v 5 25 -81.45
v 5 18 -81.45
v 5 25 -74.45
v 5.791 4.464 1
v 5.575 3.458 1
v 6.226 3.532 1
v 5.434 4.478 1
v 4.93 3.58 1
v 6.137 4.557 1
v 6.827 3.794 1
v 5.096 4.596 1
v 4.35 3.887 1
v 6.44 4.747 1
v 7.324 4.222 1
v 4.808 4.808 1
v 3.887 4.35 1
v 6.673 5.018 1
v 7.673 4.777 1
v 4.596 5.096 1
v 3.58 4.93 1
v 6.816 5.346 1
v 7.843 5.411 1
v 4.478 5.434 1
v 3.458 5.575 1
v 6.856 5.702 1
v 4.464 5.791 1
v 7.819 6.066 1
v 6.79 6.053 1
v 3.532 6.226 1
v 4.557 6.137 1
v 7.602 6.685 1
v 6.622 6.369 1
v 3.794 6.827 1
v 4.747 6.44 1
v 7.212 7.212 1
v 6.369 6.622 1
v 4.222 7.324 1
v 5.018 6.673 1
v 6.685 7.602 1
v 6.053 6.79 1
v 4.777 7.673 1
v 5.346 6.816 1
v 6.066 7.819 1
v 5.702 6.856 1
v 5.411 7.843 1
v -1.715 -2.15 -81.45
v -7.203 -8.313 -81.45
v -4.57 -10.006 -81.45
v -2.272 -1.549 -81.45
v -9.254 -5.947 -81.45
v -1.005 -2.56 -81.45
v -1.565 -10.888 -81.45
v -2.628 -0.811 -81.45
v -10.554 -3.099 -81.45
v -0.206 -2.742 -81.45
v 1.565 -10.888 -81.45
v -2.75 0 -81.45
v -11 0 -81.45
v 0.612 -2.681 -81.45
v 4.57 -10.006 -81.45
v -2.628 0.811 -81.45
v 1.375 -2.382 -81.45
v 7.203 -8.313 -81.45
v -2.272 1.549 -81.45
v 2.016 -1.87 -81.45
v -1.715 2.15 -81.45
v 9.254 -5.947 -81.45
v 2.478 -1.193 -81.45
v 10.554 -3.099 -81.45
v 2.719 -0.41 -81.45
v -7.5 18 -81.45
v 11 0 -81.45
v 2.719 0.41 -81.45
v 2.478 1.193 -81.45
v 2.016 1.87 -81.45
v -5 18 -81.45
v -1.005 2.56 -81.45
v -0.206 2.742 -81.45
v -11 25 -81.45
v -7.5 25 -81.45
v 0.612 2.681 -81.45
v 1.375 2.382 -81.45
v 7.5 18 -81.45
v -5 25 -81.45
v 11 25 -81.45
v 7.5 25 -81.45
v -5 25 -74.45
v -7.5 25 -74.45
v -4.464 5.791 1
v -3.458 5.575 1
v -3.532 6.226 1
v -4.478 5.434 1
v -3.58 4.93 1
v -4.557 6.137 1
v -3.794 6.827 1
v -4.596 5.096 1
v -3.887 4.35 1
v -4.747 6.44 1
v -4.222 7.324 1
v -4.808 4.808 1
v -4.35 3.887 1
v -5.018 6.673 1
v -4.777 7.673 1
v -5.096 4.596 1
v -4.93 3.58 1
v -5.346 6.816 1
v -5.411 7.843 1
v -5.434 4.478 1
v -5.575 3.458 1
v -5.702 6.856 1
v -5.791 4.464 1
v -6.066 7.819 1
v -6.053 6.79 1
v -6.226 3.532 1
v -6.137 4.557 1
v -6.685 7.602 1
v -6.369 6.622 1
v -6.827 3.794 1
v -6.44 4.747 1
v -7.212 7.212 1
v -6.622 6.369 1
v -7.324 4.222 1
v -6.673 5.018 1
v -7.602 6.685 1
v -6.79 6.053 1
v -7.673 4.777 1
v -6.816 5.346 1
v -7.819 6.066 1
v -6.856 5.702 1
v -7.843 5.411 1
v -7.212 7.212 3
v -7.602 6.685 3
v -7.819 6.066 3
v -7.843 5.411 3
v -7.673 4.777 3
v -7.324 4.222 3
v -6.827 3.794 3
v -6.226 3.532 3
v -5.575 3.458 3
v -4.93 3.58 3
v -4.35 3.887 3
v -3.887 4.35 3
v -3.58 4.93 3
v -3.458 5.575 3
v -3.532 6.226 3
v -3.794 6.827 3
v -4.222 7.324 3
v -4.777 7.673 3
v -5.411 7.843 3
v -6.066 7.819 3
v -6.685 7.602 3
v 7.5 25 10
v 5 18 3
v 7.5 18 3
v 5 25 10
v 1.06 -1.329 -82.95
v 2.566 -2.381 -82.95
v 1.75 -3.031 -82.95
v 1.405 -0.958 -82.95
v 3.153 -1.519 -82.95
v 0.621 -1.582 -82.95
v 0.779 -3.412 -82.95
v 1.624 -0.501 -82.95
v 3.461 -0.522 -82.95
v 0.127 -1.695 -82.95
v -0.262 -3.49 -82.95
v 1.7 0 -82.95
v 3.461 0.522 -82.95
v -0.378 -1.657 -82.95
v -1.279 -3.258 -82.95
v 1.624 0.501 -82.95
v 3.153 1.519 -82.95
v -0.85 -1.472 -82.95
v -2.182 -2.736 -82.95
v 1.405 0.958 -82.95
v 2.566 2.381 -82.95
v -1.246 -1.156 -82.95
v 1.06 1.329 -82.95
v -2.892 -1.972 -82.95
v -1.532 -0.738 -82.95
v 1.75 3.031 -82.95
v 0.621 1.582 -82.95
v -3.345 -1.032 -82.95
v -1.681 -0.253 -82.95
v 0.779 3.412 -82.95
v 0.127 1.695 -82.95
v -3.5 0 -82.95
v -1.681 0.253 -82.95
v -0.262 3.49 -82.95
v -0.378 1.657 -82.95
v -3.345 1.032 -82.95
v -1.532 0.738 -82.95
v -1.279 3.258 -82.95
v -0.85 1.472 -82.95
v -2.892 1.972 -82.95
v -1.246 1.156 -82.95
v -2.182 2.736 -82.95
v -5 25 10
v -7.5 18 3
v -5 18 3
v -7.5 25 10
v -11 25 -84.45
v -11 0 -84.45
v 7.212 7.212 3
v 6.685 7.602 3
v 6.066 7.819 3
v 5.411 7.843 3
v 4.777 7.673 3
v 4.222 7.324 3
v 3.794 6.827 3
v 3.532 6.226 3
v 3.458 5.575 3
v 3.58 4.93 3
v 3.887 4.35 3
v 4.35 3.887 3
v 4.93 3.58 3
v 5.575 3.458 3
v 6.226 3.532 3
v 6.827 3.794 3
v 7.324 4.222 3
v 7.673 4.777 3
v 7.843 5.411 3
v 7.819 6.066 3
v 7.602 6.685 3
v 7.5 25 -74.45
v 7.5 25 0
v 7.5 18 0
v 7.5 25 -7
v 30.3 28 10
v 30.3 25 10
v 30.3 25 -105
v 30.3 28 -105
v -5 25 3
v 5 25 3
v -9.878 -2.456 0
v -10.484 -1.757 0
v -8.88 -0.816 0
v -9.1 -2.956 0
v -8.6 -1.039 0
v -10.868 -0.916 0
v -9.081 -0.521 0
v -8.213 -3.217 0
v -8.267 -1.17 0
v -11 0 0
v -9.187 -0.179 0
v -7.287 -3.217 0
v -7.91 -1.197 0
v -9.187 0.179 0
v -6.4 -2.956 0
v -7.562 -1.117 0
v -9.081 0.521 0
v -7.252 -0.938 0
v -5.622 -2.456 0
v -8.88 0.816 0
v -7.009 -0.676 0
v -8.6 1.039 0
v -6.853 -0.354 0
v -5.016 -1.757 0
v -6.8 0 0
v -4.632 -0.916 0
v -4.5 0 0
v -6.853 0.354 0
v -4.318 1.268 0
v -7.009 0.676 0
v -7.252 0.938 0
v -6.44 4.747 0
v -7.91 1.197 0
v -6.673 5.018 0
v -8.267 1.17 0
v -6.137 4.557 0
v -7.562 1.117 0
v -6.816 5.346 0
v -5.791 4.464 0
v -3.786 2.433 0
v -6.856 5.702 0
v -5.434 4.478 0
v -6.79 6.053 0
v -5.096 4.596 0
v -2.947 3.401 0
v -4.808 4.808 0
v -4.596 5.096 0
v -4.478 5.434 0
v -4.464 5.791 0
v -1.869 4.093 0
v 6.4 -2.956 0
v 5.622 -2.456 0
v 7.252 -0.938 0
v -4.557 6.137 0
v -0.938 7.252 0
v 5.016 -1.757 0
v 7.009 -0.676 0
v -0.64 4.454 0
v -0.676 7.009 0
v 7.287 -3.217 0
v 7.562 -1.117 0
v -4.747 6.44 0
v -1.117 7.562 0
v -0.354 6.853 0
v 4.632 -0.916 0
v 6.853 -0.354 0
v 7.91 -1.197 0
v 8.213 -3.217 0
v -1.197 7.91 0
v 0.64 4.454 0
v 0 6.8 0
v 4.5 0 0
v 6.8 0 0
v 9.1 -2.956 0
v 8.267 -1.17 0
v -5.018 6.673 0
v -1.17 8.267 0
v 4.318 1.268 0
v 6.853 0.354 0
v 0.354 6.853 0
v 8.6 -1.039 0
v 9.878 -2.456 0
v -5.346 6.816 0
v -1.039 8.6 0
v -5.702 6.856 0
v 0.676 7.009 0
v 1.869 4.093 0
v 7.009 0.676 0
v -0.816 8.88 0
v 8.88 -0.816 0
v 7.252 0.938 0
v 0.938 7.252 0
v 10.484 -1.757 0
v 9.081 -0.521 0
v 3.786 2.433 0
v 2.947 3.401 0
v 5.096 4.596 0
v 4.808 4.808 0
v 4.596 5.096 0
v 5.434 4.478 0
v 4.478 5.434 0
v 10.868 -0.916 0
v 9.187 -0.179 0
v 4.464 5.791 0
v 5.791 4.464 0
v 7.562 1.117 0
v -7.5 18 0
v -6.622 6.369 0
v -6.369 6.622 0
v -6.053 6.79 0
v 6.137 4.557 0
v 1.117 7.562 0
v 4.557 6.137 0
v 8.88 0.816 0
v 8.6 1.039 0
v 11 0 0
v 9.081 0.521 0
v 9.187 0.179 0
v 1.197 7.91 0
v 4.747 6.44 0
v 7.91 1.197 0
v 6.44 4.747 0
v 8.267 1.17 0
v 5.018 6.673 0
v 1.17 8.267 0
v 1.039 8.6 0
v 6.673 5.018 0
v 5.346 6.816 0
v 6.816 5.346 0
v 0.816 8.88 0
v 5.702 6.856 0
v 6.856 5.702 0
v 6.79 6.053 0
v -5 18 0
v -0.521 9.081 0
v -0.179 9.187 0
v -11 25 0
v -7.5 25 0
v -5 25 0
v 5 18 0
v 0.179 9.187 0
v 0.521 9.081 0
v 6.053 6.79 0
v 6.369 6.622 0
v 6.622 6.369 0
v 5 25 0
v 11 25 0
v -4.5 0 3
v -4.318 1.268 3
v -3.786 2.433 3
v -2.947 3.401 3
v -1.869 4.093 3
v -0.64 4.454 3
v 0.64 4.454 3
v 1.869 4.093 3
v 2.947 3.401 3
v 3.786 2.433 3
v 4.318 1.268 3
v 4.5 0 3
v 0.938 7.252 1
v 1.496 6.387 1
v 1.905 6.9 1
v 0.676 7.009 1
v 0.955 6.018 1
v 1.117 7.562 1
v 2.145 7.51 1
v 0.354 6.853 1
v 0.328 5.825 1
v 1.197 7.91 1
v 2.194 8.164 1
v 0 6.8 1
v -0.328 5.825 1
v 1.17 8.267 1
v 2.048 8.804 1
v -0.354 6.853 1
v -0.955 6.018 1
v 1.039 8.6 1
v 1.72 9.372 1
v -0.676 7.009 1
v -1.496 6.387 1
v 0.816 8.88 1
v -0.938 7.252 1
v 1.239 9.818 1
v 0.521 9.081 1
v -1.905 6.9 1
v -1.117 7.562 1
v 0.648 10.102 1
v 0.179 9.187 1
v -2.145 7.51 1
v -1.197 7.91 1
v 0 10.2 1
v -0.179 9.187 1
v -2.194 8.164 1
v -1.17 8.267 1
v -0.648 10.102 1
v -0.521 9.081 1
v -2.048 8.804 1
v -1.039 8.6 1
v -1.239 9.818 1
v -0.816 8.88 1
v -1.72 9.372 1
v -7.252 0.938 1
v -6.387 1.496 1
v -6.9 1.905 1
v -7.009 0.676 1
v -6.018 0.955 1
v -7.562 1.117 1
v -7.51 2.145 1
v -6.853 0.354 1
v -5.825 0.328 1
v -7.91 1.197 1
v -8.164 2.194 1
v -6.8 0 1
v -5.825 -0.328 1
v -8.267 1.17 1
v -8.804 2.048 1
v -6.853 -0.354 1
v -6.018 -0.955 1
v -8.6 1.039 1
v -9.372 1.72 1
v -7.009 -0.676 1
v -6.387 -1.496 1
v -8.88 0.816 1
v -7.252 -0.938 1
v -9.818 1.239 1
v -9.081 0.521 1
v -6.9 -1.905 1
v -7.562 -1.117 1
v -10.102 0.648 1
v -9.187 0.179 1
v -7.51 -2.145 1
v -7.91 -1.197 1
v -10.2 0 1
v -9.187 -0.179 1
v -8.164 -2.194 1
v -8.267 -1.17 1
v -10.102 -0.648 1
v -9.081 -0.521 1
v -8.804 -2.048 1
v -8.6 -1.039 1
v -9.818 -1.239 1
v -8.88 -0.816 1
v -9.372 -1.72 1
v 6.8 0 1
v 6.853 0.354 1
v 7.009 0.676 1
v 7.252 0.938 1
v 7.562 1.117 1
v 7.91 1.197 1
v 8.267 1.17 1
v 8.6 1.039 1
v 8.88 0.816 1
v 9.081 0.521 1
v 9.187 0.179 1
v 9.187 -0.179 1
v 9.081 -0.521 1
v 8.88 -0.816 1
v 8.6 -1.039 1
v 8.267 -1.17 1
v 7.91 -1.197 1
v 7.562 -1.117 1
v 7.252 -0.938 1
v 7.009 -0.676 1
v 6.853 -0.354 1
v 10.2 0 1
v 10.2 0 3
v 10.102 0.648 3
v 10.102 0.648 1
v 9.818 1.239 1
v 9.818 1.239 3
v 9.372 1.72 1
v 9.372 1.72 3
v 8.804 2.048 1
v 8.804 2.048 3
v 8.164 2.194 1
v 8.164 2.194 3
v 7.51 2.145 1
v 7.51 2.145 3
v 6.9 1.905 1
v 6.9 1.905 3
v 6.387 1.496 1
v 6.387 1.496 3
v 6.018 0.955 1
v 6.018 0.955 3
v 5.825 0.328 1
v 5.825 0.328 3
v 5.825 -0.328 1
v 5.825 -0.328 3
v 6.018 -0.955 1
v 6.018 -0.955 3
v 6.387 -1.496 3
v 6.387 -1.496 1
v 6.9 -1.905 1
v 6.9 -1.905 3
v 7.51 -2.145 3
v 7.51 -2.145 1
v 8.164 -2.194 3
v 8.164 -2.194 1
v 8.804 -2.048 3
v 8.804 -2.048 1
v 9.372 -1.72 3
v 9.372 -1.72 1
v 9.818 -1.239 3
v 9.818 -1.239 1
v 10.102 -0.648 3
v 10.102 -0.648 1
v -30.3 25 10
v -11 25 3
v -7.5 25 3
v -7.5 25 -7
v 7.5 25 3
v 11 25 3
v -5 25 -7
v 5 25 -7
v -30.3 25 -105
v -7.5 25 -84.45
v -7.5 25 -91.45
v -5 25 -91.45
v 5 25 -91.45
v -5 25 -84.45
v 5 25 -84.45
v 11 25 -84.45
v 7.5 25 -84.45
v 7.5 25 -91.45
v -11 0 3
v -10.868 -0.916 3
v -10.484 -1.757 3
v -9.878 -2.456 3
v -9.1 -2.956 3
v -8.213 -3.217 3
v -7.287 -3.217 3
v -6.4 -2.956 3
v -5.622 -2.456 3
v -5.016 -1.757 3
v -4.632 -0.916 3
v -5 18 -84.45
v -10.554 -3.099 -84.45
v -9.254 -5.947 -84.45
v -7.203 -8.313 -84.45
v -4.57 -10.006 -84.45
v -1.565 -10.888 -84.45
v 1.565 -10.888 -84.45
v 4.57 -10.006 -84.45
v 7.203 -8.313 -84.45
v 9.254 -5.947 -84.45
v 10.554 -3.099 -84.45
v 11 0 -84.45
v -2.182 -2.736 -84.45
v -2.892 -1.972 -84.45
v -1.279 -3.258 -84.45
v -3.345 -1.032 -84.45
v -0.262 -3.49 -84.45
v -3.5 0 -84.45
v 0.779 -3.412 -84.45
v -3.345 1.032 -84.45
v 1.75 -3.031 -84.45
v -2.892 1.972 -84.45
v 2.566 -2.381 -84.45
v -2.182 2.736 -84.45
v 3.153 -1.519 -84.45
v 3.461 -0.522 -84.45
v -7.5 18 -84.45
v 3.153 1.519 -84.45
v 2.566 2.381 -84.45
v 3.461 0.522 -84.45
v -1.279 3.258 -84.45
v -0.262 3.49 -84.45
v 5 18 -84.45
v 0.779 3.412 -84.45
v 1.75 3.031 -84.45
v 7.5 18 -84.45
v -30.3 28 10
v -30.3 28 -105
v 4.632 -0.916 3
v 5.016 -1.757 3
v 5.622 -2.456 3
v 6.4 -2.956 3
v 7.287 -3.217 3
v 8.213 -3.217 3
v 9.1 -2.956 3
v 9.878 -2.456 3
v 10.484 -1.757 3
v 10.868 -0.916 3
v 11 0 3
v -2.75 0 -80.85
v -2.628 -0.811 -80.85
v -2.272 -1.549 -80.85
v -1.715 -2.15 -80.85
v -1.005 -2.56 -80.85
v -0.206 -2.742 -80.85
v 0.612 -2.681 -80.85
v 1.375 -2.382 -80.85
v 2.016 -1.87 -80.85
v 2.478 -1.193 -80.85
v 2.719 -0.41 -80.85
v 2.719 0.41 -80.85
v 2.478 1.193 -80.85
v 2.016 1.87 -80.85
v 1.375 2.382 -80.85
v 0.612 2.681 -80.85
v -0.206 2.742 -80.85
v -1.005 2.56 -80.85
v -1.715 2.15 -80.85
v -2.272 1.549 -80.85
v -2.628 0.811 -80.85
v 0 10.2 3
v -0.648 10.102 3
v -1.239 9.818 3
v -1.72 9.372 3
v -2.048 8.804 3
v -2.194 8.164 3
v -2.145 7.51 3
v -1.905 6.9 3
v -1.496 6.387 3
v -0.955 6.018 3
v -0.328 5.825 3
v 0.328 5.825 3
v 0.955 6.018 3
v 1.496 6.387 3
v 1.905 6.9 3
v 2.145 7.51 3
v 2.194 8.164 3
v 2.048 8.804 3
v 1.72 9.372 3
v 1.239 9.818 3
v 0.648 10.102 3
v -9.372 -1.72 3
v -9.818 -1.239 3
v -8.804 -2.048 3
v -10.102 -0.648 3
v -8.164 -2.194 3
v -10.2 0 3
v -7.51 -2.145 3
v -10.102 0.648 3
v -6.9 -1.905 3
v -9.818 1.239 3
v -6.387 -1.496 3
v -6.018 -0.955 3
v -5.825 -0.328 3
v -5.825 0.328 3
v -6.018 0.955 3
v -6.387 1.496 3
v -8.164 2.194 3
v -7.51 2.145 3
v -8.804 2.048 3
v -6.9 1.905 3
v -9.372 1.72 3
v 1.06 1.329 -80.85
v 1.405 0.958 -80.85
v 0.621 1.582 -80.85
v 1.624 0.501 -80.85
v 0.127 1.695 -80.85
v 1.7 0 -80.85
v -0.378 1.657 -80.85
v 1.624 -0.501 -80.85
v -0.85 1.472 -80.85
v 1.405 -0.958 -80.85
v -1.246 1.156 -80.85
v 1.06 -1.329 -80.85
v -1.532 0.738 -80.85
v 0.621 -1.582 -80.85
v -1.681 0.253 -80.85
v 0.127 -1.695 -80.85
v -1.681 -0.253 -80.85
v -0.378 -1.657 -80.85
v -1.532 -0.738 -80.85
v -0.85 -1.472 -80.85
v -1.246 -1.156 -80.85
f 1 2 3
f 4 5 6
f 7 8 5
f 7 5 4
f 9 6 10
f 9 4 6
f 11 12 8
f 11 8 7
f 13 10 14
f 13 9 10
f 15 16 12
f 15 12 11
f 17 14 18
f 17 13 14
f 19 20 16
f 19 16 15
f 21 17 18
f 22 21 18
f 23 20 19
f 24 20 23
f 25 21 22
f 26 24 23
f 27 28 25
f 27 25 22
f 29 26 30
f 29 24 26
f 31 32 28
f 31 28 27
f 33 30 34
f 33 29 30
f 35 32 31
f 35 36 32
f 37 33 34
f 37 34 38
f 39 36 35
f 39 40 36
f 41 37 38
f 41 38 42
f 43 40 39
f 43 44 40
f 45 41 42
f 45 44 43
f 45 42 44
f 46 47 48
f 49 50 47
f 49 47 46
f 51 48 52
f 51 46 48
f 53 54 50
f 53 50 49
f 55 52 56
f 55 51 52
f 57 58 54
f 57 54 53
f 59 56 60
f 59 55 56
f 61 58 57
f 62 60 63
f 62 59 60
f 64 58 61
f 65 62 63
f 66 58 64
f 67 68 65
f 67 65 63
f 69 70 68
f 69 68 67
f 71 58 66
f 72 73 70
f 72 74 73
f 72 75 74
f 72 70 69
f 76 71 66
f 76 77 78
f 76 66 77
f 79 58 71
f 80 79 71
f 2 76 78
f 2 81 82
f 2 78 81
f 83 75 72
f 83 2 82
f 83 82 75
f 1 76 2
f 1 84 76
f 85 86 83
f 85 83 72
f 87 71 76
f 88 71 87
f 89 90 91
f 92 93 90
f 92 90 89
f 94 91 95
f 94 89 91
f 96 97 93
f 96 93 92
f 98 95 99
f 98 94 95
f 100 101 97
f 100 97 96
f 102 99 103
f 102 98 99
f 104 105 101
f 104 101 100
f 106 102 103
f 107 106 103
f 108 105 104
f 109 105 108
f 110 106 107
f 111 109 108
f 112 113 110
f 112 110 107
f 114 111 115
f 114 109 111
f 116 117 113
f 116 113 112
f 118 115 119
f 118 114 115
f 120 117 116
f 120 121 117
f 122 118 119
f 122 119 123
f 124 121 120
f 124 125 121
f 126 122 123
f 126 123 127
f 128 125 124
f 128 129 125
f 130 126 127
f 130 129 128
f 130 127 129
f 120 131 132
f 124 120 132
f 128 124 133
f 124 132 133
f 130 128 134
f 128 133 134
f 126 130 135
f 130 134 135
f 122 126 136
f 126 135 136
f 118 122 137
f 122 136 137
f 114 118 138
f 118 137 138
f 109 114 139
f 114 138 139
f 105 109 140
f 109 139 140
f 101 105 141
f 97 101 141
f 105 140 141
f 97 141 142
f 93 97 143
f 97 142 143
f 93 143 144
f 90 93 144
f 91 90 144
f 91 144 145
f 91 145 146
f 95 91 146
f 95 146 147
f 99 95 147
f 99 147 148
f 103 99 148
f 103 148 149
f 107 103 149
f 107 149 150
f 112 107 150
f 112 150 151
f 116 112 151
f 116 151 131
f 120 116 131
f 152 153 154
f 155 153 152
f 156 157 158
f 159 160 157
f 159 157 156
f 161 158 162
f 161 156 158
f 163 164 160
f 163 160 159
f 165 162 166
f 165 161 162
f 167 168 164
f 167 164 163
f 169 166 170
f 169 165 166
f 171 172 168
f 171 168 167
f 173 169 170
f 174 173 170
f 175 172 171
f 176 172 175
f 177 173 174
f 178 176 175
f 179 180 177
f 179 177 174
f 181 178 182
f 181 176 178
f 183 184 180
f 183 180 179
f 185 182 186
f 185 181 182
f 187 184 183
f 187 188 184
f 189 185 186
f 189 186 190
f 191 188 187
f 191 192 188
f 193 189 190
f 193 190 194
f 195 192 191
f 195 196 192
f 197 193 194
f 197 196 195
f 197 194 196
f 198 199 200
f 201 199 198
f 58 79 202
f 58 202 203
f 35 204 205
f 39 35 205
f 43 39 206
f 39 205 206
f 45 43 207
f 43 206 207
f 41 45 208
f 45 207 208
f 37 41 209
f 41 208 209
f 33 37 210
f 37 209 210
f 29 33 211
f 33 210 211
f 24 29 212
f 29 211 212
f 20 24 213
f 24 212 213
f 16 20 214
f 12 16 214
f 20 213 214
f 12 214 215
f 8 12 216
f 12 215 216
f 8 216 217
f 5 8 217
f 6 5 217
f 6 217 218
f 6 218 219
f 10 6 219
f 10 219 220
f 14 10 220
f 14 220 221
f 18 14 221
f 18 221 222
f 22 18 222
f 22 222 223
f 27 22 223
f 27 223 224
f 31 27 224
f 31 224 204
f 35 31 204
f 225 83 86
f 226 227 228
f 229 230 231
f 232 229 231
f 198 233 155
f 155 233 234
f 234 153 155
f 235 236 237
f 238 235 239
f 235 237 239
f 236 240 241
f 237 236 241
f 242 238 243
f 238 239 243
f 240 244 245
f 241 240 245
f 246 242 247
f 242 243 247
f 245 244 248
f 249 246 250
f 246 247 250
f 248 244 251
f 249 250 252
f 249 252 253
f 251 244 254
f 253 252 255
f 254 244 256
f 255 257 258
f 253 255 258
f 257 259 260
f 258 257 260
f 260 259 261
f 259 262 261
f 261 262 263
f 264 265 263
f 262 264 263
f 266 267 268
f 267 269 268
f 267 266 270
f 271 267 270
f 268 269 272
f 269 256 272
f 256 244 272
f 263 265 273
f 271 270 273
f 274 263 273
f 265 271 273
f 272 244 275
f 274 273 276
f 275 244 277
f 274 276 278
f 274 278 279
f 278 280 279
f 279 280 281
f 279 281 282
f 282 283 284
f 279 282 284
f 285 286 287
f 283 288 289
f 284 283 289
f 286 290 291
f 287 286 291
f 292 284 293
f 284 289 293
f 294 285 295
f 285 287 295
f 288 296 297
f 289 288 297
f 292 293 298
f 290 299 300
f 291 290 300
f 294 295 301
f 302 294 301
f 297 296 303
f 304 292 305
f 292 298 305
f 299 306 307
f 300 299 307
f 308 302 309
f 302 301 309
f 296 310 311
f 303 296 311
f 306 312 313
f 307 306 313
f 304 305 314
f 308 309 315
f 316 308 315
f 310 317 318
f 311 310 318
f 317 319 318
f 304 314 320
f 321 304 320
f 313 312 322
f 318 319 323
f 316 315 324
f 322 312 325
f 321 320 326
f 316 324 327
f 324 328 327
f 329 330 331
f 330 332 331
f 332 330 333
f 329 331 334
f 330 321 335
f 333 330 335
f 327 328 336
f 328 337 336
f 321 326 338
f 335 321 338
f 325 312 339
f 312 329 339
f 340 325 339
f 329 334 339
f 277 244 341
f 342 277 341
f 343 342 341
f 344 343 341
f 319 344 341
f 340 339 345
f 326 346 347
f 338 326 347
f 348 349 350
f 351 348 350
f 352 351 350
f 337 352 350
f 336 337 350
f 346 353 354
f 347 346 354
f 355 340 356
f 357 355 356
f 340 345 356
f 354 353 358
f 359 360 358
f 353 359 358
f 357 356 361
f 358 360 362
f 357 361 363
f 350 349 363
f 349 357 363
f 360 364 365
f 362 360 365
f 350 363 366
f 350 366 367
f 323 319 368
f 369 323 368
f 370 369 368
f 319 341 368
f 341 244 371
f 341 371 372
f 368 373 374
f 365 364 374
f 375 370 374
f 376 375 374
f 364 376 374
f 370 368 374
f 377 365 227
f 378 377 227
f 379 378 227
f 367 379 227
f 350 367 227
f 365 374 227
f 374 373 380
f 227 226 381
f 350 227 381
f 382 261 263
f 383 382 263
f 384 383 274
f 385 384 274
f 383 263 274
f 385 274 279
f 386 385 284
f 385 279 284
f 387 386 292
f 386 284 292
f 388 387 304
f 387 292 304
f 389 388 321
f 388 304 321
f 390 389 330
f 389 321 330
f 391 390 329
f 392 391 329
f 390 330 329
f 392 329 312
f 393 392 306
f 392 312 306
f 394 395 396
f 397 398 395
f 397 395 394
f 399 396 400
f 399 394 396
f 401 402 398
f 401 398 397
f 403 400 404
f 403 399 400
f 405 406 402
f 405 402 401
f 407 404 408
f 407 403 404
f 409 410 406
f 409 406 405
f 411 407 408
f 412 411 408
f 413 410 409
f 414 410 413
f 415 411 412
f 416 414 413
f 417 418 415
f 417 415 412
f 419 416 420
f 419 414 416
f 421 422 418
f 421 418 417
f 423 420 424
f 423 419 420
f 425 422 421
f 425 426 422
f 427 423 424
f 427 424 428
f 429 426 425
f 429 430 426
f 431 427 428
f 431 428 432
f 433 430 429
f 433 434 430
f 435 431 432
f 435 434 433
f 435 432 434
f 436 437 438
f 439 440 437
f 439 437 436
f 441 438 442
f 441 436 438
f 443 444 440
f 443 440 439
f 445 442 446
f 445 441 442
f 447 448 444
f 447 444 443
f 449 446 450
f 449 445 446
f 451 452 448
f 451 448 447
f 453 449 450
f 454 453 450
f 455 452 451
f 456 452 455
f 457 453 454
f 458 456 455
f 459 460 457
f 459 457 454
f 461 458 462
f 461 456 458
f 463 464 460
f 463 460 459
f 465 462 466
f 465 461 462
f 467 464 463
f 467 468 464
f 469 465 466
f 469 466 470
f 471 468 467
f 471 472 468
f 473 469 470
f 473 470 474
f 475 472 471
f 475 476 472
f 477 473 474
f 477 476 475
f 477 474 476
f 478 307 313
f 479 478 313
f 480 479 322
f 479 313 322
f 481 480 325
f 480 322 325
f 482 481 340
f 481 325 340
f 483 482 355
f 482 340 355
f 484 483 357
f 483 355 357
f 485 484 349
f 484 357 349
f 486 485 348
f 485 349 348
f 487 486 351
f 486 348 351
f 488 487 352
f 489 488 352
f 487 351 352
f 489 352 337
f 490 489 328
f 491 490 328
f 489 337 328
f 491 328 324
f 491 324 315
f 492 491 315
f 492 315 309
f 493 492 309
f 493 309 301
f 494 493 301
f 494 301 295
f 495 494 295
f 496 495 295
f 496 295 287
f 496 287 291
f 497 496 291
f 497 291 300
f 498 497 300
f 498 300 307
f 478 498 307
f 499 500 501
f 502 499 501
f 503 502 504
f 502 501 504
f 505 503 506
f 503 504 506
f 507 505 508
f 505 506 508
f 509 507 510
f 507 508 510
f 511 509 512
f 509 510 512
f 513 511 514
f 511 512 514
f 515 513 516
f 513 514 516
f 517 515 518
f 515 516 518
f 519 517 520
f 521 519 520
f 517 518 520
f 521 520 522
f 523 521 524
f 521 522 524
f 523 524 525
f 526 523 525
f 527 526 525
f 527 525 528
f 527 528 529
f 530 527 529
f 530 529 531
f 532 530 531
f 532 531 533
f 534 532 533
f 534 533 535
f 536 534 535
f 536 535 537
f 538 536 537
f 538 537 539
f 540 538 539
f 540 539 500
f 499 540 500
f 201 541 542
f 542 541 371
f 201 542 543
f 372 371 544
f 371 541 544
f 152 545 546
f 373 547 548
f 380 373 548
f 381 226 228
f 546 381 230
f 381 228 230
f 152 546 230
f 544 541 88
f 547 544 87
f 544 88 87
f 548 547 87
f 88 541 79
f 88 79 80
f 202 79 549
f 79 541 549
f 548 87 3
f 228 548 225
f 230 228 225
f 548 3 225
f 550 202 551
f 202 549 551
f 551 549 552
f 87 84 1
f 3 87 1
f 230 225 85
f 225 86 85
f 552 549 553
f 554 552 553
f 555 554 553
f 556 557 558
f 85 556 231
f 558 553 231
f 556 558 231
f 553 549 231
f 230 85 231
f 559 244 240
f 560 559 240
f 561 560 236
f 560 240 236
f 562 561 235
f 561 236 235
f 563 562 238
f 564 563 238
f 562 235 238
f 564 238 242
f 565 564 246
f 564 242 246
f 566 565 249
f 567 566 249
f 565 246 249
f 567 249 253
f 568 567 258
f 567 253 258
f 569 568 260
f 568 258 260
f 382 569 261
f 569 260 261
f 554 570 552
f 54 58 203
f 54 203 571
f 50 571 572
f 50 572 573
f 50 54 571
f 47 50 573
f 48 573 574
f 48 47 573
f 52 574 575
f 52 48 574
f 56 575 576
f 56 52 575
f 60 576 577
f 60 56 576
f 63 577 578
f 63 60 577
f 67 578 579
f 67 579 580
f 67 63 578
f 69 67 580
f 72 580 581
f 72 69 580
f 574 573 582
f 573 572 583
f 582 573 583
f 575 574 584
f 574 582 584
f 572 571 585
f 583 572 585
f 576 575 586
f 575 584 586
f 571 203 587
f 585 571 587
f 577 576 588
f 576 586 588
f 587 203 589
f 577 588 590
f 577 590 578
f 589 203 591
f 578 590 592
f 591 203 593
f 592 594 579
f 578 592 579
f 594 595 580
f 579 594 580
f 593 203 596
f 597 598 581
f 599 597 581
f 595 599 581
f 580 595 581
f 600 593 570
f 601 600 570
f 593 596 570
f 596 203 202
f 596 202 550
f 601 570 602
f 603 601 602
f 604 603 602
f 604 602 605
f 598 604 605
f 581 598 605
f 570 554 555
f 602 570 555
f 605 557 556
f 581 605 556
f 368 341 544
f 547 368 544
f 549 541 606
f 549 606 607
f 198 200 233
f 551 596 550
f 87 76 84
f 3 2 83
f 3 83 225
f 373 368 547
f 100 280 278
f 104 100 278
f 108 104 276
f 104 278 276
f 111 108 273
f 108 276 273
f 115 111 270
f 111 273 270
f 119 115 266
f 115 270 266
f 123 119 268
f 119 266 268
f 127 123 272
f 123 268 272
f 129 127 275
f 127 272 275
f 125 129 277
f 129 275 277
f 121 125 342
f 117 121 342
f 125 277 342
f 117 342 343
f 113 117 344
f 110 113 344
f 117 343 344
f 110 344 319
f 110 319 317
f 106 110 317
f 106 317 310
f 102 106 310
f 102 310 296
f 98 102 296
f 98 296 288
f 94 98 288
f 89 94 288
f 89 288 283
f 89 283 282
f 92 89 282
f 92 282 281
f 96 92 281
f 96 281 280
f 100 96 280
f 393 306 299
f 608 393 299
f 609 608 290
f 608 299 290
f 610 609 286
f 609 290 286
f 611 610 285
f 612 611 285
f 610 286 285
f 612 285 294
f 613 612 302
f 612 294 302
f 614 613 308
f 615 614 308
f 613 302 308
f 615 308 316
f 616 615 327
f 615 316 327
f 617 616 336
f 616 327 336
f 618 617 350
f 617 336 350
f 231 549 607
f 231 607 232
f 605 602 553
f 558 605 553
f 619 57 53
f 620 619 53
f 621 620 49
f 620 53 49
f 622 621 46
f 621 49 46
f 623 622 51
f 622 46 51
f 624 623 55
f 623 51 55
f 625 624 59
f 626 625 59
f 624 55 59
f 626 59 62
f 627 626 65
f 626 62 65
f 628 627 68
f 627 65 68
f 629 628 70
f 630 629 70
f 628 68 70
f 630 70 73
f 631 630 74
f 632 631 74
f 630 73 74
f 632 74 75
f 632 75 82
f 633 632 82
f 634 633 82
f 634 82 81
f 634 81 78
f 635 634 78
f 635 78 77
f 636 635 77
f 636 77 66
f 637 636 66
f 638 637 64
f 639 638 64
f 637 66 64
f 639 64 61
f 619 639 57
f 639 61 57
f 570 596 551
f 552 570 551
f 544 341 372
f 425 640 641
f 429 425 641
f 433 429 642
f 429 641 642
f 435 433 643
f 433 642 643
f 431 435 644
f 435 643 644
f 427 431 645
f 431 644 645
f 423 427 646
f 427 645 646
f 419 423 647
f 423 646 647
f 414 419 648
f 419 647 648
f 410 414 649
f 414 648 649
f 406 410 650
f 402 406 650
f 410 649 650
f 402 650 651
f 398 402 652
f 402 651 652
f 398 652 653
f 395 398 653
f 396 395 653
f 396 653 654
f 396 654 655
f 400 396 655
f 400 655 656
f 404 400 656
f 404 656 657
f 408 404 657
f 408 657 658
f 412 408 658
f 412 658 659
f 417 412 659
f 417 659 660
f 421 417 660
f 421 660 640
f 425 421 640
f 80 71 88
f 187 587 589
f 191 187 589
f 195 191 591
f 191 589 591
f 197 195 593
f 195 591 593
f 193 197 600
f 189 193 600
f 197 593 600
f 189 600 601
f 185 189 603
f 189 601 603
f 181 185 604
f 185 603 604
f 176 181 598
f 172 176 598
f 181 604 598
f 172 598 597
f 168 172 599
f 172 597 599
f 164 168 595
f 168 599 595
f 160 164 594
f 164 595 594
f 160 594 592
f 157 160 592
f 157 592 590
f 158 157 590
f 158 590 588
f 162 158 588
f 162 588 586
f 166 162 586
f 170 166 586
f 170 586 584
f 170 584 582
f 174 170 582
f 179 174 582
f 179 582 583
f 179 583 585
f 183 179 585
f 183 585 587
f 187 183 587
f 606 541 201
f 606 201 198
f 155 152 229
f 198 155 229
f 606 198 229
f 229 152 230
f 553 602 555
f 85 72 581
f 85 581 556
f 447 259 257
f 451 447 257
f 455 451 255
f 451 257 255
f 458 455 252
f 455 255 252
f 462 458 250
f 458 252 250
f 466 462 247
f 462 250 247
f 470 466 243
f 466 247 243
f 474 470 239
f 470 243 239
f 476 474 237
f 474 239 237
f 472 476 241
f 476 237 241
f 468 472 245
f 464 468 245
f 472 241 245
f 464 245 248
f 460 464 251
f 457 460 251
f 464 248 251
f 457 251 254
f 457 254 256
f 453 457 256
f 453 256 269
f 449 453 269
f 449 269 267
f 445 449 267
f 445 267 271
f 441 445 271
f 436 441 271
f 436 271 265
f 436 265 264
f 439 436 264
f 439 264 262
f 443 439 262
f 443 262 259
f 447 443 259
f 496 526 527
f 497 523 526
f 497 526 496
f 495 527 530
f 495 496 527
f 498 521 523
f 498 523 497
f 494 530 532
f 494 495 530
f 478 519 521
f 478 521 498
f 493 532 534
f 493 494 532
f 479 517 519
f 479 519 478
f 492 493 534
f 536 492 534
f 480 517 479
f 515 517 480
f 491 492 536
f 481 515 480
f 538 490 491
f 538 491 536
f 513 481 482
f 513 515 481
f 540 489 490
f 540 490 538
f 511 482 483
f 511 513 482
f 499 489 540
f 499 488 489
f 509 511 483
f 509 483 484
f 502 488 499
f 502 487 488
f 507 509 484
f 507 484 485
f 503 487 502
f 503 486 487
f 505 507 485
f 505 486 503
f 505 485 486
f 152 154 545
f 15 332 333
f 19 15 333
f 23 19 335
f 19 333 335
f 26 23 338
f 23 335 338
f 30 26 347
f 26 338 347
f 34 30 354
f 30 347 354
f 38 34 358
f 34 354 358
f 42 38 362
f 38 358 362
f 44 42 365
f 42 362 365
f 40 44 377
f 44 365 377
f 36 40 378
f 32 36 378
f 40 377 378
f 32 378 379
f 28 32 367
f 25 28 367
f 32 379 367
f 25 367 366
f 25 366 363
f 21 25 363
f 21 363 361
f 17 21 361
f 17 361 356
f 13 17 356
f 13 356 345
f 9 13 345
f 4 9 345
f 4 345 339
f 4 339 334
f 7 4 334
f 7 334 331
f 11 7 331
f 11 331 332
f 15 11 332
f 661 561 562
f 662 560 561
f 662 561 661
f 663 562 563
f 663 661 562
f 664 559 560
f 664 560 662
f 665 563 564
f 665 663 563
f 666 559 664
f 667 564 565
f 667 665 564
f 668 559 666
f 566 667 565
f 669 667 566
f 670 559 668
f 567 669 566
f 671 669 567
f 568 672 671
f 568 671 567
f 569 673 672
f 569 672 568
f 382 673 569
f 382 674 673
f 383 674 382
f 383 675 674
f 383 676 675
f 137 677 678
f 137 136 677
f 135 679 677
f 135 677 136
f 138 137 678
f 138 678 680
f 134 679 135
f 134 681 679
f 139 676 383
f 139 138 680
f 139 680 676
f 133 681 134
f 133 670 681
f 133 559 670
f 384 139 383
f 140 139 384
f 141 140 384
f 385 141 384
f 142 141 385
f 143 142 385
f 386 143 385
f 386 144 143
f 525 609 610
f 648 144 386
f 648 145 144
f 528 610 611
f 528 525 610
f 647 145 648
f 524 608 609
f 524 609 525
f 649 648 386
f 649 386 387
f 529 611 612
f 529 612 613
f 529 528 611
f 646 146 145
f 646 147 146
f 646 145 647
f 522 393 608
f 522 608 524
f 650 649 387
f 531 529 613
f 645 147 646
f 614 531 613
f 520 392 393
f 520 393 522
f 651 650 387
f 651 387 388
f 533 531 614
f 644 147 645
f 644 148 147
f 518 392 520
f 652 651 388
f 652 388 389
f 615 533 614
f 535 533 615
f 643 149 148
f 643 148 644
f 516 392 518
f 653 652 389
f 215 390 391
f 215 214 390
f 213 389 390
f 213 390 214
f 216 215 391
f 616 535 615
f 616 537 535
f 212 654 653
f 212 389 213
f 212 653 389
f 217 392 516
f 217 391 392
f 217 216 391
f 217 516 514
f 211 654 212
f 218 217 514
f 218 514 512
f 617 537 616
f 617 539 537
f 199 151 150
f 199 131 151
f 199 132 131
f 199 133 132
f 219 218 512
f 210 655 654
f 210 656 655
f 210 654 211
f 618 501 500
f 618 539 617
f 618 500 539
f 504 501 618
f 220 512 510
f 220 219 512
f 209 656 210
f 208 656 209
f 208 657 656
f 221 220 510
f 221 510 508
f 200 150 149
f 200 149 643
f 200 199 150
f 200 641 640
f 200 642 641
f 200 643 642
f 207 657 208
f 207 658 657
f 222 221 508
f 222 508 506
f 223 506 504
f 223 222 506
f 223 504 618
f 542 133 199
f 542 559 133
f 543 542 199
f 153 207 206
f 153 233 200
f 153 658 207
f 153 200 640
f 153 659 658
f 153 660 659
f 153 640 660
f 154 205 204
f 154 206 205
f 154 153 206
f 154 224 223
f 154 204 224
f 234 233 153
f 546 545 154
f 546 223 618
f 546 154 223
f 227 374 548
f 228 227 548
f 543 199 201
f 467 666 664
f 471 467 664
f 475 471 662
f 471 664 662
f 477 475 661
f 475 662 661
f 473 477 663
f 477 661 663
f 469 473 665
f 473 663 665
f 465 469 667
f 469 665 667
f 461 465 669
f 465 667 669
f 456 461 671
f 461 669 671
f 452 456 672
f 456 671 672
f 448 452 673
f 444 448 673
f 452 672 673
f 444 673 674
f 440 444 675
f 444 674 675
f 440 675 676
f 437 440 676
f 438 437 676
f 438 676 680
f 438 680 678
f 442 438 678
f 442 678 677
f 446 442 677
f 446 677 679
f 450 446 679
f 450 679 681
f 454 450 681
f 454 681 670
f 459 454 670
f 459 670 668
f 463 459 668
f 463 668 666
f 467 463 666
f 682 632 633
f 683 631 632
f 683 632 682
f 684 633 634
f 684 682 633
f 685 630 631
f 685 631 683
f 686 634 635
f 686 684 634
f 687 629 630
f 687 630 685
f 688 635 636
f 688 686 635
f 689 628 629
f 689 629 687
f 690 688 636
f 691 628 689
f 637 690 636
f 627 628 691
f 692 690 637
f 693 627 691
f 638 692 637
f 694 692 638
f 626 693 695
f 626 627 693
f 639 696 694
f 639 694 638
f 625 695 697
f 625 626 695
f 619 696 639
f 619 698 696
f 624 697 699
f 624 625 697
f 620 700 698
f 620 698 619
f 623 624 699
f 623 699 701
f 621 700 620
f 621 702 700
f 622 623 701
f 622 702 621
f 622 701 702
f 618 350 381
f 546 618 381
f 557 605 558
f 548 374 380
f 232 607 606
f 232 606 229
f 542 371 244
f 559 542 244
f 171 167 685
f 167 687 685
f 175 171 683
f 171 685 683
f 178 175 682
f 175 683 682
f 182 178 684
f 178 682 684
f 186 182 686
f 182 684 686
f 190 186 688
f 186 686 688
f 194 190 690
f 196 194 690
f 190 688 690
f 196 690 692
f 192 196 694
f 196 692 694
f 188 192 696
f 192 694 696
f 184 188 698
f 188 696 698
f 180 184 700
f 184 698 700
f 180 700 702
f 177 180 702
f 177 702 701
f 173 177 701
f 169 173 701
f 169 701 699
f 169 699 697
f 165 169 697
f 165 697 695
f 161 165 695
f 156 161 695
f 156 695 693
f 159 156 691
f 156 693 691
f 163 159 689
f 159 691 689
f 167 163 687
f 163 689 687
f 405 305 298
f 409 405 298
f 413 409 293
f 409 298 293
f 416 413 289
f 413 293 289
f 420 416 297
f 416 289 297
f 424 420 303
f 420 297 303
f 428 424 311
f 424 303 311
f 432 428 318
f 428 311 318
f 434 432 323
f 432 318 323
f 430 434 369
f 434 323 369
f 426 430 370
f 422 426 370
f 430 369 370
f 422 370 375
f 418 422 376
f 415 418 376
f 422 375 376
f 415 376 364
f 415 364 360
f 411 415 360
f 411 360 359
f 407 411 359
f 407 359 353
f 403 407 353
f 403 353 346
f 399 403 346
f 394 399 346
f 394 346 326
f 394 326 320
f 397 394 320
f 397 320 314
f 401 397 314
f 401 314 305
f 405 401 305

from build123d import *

# Parameters (mm, degrees)
RESSALTO_EXTRUS_O1_DEPTH                            = 3
ESBO_O2_W                                           = 60.6
ESBO_O2_H                                           = 115
RESSALTO_EXTRUS_O2_DEPTH                            = 3
RESSALTO_EXTRUS_O3_DEPTH                            = 3
REBAIXO_PARA_SHCS_M21_D                             = 2.4
REBAIXO_PARA_SHCS_M21_DEPTH                         = 3
REBAIXO_PARA_SHCS_M21_CBORE_D                       = 4.4
REBAIXO_PARA_SHCS_M21_CBORE_DEPTH                   = 2
PADR_OCIRCULAR1_COUNT                               = 5
PADR_OCIRCULAR1_ANGLE                               = 180
NERVURA1_REACH                                      = 114.814
ESBO_O6_WALL_W                                      = 237.528305154
ESBO_O6_WALL_H                                      = 15
CORTE_EXTRUS_O1_REACH                               = 117.612
ESBO_O7_W                                           = 10
ESBO_O7_H                                           = 7
NERVURA7_REACH                                      = 114.814
ESBO_O8_WALL_W                                      = 237.528305154
ESBO_O8_WALL_H                                      = 15
CORTE_EXTRUS_O2_REACH                               = 114.814
ESBO_O9_W                                           = 10
ESBO_O9_H                                           = 7
PADR_O_LINEAR1_COUNT                                = 2
PADR_O_LINEAR1_PITCH                                = 84.45
ESBO_O10_R                                          = 2.75
RESSALTO_EXTRUS_O4_DEPTH                            = 0.6
REBAIXO_PARA_PARAFUSO_COM_CABE_A_PANELA_D           = 3.4
REBAIXO_PARA_PARAFUSO_COM_CABE_A_PANELA_CBORE_D     = 7
REBAIXO_PARA_PARAFUSO_COM_CABE_A_PANELA_CBORE_DEPTH = 1.5


with BuildPart() as part:
    # Esboço1 → Ressalto-extrusão1 (new body)
    with BuildSketch(Plane.XY):
        with BuildLine():
            Line((11, 0), (11, 25))
            Line((11, 25), (-11, 25))
            Line((-11, 25), (-11, 0))
            ThreePointArc((-11, 0), (-7.75, -3.25), (-4.5, 0))
            ThreePointArc((-4.5, 0), (0, 4.5), (4.5, 0))
            ThreePointArc((4.5, 0), (7.75, -3.25), (11, 0))
        make_face()
    extrude(amount=RESSALTO_EXTRUS_O1_DEPTH)

    # Esboço2 → Ressalto-extrusão2 (add)
    with BuildSketch(Plane(origin=(0, 25, 0), x_dir=(1, 0, 0), z_dir=(0, 1, 0))):
        with Locations((0, 47.5)):
            Rectangle(ESBO_O2_W, ESBO_O2_H)
    extrude(amount=RESSALTO_EXTRUS_O2_DEPTH)

    # Esboço3 → Ressalto-extrusão3 (add)
    with BuildSketch(Plane(origin=(0, 0, -81.45), x_dir=(-1, 0, 0), z_dir=(0, 0, -1))):
        with BuildLine():
            Line((-11, 0), (-11, 25))
            Line((-11, 25), (11, 25))
            Line((11, 25), (11, 0))
            ThreePointArc((11, 0), (0, -11), (-11, 0))
        make_face()
    extrude(amount=RESSALTO_EXTRUS_O3_DEPTH)

    # Rebaixo para SHCS M21
    with Locations(Plane.XY.offset(3)):
        with Locations((8, 0)):
            rebaixo_para_shcs_m21 = CounterBoreHole(REBAIXO_PARA_SHCS_M21_D / 2, REBAIXO_PARA_SHCS_M21_CBORE_D / 2, REBAIXO_PARA_SHCS_M21_CBORE_DEPTH, depth=REBAIXO_PARA_SHCS_M21_DEPTH)

    # PadrãoCircular1: Rebaixo para SHCS M21 ×5 about axis
    padr_ocircular1_axis = Axis((0, 0, 0), (0, 0, 1))
    for i in range(1, PADR_OCIRCULAR1_COUNT):
        add(rebaixo_para_shcs_m21.rotate(padr_ocircular1_axis, i * PADR_OCIRCULAR1_ANGLE / (PADR_OCIRCULAR1_COUNT - 1)), mode=Mode.SUBTRACT)

    # Esboço6 wall → Nervura1 (add, up to next)
    with BuildSketch(Plane(origin=(0, 21.5, 6.5), x_dir=(0, 0.707106781187, 0.707106781187), z_dir=(0, -0.707106781187, 0.707106781187)), mode=Mode.PRIVATE) as nervura1_sk1:
        Rectangle(ESBO_O6_WALL_W, ESBO_O6_WALL_H)
    nervura1_tool1 = extrude(nervura1_sk1.sketch, amount=-NERVURA1_REACH, mode=Mode.PRIVATE) - part.part
    nervura1 = nervura1_tool1.solids().sort_by_distance((0, 21.5, 6.5))[0]
    add(nervura1)

    # Corte-extrusão1: up to this face of the body (flat: up to its plane)
    corte_extrus_o1_end = Plane(part.part.faces().sort_by_distance((0, 21.5, 6.5))[0])
    # Esboço7 → Corte-extrusão1 (cut, up to the picked face)
    with BuildSketch(Plane.XY.offset(3), mode=Mode.PRIVATE) as corte_extrus_o1_sk1:
        with Locations((0, 21.5)):
            Rectangle(ESBO_O7_W, ESBO_O7_H)
    corte_extrus_o1_tool1 = split(extrude(corte_extrus_o1_sk1.sketch, amount=CORTE_EXTRUS_O1_REACH, mode=Mode.PRIVATE), bisect_by=corte_extrus_o1_end, keep=Keep.BOTH, mode=Mode.PRIVATE)
    corte_extrus_o1 = corte_extrus_o1_tool1.solids().sort_by(Axis((0, 21.5, 3), (0, 0, 1)))[0]
    add(corte_extrus_o1, mode=Mode.SUBTRACT)

    # Esboço8 wall → Nervura7 (add, up to next)
    with BuildSketch(Plane(origin=(0, 21.5, -3.5), x_dir=(0, 0.707106781187, -0.707106781187), z_dir=(0, 0.707106781187, 0.707106781187)), mode=Mode.PRIVATE) as nervura7_sk1:
        Rectangle(ESBO_O8_WALL_W, ESBO_O8_WALL_H)
    nervura7_tool1 = extrude(nervura7_sk1.sketch, amount=NERVURA7_REACH, mode=Mode.PRIVATE) - part.part
    nervura7 = nervura7_tool1.solids().sort_by_distance((0, 21.5, -3.5))[0]
    add(nervura7)

    # Corte-extrusão2: up to this face of the body (flat: up to its plane)
    corte_extrus_o2_end = Plane(part.part.faces().sort_by_distance((0, 21.5, -3.5))[0])
    # Esboço9 → Corte-extrusão2 (cut, up to the picked face)
    with BuildSketch(Plane(origin=(0, 0, 0), x_dir=(-1, 0, 0), z_dir=(0, 0, -1)), mode=Mode.PRIVATE) as corte_extrus_o2_sk1:
        with Locations((0, 21.5)):
            Rectangle(ESBO_O9_W, ESBO_O9_H)
    corte_extrus_o2_tool1 = split(extrude(corte_extrus_o2_sk1.sketch, amount=CORTE_EXTRUS_O2_REACH, mode=Mode.PRIVATE), bisect_by=corte_extrus_o2_end, keep=Keep.BOTH, mode=Mode.PRIVATE)
    corte_extrus_o2 = corte_extrus_o2_tool1.solids().sort_by(Axis((0, 21.5, 0), (0, 0, -1)))[0]
    add(corte_extrus_o2, mode=Mode.SUBTRACT)

    # Padrão linear1: Nervura1, Corte-extrusão1, Nervura7, Corte-extrusão2 ×2
    with Locations(*[(0, 0, -i * PADR_O_LINEAR1_PITCH) for i in range(1, PADR_O_LINEAR1_COUNT)]):
        add(nervura1)
        add(corte_extrus_o1, mode=Mode.SUBTRACT)
        add(nervura7)
        add(corte_extrus_o2, mode=Mode.SUBTRACT)

    # Esboço10 → Ressalto-extrusão4 (add)
    with BuildSketch(Plane.XY.offset(-81.45)):
        with Locations(Location((0, 0, 0), (0, 0, 180))):
            Circle(ESBO_O10_R)
    extrude(amount=RESSALTO_EXTRUS_O4_DEPTH)

    # Rebaixo para parafuso com cabeça panela de M31 (through all)
    with Locations(Plane(origin=(0, 0, -84.45), x_dir=(-1, 0, 0), z_dir=(0, 0, -1))):
        with Locations((0, 0)):
            CounterBoreHole(REBAIXO_PARA_PARAFUSO_COM_CABE_A_PANELA_D / 2, REBAIXO_PARA_PARAFUSO_COM_CABE_A_PANELA_CBORE_D / 2, REBAIXO_PARA_PARAFUSO_COM_CABE_A_PANELA_CBORE_DEPTH)


solid = part.part
